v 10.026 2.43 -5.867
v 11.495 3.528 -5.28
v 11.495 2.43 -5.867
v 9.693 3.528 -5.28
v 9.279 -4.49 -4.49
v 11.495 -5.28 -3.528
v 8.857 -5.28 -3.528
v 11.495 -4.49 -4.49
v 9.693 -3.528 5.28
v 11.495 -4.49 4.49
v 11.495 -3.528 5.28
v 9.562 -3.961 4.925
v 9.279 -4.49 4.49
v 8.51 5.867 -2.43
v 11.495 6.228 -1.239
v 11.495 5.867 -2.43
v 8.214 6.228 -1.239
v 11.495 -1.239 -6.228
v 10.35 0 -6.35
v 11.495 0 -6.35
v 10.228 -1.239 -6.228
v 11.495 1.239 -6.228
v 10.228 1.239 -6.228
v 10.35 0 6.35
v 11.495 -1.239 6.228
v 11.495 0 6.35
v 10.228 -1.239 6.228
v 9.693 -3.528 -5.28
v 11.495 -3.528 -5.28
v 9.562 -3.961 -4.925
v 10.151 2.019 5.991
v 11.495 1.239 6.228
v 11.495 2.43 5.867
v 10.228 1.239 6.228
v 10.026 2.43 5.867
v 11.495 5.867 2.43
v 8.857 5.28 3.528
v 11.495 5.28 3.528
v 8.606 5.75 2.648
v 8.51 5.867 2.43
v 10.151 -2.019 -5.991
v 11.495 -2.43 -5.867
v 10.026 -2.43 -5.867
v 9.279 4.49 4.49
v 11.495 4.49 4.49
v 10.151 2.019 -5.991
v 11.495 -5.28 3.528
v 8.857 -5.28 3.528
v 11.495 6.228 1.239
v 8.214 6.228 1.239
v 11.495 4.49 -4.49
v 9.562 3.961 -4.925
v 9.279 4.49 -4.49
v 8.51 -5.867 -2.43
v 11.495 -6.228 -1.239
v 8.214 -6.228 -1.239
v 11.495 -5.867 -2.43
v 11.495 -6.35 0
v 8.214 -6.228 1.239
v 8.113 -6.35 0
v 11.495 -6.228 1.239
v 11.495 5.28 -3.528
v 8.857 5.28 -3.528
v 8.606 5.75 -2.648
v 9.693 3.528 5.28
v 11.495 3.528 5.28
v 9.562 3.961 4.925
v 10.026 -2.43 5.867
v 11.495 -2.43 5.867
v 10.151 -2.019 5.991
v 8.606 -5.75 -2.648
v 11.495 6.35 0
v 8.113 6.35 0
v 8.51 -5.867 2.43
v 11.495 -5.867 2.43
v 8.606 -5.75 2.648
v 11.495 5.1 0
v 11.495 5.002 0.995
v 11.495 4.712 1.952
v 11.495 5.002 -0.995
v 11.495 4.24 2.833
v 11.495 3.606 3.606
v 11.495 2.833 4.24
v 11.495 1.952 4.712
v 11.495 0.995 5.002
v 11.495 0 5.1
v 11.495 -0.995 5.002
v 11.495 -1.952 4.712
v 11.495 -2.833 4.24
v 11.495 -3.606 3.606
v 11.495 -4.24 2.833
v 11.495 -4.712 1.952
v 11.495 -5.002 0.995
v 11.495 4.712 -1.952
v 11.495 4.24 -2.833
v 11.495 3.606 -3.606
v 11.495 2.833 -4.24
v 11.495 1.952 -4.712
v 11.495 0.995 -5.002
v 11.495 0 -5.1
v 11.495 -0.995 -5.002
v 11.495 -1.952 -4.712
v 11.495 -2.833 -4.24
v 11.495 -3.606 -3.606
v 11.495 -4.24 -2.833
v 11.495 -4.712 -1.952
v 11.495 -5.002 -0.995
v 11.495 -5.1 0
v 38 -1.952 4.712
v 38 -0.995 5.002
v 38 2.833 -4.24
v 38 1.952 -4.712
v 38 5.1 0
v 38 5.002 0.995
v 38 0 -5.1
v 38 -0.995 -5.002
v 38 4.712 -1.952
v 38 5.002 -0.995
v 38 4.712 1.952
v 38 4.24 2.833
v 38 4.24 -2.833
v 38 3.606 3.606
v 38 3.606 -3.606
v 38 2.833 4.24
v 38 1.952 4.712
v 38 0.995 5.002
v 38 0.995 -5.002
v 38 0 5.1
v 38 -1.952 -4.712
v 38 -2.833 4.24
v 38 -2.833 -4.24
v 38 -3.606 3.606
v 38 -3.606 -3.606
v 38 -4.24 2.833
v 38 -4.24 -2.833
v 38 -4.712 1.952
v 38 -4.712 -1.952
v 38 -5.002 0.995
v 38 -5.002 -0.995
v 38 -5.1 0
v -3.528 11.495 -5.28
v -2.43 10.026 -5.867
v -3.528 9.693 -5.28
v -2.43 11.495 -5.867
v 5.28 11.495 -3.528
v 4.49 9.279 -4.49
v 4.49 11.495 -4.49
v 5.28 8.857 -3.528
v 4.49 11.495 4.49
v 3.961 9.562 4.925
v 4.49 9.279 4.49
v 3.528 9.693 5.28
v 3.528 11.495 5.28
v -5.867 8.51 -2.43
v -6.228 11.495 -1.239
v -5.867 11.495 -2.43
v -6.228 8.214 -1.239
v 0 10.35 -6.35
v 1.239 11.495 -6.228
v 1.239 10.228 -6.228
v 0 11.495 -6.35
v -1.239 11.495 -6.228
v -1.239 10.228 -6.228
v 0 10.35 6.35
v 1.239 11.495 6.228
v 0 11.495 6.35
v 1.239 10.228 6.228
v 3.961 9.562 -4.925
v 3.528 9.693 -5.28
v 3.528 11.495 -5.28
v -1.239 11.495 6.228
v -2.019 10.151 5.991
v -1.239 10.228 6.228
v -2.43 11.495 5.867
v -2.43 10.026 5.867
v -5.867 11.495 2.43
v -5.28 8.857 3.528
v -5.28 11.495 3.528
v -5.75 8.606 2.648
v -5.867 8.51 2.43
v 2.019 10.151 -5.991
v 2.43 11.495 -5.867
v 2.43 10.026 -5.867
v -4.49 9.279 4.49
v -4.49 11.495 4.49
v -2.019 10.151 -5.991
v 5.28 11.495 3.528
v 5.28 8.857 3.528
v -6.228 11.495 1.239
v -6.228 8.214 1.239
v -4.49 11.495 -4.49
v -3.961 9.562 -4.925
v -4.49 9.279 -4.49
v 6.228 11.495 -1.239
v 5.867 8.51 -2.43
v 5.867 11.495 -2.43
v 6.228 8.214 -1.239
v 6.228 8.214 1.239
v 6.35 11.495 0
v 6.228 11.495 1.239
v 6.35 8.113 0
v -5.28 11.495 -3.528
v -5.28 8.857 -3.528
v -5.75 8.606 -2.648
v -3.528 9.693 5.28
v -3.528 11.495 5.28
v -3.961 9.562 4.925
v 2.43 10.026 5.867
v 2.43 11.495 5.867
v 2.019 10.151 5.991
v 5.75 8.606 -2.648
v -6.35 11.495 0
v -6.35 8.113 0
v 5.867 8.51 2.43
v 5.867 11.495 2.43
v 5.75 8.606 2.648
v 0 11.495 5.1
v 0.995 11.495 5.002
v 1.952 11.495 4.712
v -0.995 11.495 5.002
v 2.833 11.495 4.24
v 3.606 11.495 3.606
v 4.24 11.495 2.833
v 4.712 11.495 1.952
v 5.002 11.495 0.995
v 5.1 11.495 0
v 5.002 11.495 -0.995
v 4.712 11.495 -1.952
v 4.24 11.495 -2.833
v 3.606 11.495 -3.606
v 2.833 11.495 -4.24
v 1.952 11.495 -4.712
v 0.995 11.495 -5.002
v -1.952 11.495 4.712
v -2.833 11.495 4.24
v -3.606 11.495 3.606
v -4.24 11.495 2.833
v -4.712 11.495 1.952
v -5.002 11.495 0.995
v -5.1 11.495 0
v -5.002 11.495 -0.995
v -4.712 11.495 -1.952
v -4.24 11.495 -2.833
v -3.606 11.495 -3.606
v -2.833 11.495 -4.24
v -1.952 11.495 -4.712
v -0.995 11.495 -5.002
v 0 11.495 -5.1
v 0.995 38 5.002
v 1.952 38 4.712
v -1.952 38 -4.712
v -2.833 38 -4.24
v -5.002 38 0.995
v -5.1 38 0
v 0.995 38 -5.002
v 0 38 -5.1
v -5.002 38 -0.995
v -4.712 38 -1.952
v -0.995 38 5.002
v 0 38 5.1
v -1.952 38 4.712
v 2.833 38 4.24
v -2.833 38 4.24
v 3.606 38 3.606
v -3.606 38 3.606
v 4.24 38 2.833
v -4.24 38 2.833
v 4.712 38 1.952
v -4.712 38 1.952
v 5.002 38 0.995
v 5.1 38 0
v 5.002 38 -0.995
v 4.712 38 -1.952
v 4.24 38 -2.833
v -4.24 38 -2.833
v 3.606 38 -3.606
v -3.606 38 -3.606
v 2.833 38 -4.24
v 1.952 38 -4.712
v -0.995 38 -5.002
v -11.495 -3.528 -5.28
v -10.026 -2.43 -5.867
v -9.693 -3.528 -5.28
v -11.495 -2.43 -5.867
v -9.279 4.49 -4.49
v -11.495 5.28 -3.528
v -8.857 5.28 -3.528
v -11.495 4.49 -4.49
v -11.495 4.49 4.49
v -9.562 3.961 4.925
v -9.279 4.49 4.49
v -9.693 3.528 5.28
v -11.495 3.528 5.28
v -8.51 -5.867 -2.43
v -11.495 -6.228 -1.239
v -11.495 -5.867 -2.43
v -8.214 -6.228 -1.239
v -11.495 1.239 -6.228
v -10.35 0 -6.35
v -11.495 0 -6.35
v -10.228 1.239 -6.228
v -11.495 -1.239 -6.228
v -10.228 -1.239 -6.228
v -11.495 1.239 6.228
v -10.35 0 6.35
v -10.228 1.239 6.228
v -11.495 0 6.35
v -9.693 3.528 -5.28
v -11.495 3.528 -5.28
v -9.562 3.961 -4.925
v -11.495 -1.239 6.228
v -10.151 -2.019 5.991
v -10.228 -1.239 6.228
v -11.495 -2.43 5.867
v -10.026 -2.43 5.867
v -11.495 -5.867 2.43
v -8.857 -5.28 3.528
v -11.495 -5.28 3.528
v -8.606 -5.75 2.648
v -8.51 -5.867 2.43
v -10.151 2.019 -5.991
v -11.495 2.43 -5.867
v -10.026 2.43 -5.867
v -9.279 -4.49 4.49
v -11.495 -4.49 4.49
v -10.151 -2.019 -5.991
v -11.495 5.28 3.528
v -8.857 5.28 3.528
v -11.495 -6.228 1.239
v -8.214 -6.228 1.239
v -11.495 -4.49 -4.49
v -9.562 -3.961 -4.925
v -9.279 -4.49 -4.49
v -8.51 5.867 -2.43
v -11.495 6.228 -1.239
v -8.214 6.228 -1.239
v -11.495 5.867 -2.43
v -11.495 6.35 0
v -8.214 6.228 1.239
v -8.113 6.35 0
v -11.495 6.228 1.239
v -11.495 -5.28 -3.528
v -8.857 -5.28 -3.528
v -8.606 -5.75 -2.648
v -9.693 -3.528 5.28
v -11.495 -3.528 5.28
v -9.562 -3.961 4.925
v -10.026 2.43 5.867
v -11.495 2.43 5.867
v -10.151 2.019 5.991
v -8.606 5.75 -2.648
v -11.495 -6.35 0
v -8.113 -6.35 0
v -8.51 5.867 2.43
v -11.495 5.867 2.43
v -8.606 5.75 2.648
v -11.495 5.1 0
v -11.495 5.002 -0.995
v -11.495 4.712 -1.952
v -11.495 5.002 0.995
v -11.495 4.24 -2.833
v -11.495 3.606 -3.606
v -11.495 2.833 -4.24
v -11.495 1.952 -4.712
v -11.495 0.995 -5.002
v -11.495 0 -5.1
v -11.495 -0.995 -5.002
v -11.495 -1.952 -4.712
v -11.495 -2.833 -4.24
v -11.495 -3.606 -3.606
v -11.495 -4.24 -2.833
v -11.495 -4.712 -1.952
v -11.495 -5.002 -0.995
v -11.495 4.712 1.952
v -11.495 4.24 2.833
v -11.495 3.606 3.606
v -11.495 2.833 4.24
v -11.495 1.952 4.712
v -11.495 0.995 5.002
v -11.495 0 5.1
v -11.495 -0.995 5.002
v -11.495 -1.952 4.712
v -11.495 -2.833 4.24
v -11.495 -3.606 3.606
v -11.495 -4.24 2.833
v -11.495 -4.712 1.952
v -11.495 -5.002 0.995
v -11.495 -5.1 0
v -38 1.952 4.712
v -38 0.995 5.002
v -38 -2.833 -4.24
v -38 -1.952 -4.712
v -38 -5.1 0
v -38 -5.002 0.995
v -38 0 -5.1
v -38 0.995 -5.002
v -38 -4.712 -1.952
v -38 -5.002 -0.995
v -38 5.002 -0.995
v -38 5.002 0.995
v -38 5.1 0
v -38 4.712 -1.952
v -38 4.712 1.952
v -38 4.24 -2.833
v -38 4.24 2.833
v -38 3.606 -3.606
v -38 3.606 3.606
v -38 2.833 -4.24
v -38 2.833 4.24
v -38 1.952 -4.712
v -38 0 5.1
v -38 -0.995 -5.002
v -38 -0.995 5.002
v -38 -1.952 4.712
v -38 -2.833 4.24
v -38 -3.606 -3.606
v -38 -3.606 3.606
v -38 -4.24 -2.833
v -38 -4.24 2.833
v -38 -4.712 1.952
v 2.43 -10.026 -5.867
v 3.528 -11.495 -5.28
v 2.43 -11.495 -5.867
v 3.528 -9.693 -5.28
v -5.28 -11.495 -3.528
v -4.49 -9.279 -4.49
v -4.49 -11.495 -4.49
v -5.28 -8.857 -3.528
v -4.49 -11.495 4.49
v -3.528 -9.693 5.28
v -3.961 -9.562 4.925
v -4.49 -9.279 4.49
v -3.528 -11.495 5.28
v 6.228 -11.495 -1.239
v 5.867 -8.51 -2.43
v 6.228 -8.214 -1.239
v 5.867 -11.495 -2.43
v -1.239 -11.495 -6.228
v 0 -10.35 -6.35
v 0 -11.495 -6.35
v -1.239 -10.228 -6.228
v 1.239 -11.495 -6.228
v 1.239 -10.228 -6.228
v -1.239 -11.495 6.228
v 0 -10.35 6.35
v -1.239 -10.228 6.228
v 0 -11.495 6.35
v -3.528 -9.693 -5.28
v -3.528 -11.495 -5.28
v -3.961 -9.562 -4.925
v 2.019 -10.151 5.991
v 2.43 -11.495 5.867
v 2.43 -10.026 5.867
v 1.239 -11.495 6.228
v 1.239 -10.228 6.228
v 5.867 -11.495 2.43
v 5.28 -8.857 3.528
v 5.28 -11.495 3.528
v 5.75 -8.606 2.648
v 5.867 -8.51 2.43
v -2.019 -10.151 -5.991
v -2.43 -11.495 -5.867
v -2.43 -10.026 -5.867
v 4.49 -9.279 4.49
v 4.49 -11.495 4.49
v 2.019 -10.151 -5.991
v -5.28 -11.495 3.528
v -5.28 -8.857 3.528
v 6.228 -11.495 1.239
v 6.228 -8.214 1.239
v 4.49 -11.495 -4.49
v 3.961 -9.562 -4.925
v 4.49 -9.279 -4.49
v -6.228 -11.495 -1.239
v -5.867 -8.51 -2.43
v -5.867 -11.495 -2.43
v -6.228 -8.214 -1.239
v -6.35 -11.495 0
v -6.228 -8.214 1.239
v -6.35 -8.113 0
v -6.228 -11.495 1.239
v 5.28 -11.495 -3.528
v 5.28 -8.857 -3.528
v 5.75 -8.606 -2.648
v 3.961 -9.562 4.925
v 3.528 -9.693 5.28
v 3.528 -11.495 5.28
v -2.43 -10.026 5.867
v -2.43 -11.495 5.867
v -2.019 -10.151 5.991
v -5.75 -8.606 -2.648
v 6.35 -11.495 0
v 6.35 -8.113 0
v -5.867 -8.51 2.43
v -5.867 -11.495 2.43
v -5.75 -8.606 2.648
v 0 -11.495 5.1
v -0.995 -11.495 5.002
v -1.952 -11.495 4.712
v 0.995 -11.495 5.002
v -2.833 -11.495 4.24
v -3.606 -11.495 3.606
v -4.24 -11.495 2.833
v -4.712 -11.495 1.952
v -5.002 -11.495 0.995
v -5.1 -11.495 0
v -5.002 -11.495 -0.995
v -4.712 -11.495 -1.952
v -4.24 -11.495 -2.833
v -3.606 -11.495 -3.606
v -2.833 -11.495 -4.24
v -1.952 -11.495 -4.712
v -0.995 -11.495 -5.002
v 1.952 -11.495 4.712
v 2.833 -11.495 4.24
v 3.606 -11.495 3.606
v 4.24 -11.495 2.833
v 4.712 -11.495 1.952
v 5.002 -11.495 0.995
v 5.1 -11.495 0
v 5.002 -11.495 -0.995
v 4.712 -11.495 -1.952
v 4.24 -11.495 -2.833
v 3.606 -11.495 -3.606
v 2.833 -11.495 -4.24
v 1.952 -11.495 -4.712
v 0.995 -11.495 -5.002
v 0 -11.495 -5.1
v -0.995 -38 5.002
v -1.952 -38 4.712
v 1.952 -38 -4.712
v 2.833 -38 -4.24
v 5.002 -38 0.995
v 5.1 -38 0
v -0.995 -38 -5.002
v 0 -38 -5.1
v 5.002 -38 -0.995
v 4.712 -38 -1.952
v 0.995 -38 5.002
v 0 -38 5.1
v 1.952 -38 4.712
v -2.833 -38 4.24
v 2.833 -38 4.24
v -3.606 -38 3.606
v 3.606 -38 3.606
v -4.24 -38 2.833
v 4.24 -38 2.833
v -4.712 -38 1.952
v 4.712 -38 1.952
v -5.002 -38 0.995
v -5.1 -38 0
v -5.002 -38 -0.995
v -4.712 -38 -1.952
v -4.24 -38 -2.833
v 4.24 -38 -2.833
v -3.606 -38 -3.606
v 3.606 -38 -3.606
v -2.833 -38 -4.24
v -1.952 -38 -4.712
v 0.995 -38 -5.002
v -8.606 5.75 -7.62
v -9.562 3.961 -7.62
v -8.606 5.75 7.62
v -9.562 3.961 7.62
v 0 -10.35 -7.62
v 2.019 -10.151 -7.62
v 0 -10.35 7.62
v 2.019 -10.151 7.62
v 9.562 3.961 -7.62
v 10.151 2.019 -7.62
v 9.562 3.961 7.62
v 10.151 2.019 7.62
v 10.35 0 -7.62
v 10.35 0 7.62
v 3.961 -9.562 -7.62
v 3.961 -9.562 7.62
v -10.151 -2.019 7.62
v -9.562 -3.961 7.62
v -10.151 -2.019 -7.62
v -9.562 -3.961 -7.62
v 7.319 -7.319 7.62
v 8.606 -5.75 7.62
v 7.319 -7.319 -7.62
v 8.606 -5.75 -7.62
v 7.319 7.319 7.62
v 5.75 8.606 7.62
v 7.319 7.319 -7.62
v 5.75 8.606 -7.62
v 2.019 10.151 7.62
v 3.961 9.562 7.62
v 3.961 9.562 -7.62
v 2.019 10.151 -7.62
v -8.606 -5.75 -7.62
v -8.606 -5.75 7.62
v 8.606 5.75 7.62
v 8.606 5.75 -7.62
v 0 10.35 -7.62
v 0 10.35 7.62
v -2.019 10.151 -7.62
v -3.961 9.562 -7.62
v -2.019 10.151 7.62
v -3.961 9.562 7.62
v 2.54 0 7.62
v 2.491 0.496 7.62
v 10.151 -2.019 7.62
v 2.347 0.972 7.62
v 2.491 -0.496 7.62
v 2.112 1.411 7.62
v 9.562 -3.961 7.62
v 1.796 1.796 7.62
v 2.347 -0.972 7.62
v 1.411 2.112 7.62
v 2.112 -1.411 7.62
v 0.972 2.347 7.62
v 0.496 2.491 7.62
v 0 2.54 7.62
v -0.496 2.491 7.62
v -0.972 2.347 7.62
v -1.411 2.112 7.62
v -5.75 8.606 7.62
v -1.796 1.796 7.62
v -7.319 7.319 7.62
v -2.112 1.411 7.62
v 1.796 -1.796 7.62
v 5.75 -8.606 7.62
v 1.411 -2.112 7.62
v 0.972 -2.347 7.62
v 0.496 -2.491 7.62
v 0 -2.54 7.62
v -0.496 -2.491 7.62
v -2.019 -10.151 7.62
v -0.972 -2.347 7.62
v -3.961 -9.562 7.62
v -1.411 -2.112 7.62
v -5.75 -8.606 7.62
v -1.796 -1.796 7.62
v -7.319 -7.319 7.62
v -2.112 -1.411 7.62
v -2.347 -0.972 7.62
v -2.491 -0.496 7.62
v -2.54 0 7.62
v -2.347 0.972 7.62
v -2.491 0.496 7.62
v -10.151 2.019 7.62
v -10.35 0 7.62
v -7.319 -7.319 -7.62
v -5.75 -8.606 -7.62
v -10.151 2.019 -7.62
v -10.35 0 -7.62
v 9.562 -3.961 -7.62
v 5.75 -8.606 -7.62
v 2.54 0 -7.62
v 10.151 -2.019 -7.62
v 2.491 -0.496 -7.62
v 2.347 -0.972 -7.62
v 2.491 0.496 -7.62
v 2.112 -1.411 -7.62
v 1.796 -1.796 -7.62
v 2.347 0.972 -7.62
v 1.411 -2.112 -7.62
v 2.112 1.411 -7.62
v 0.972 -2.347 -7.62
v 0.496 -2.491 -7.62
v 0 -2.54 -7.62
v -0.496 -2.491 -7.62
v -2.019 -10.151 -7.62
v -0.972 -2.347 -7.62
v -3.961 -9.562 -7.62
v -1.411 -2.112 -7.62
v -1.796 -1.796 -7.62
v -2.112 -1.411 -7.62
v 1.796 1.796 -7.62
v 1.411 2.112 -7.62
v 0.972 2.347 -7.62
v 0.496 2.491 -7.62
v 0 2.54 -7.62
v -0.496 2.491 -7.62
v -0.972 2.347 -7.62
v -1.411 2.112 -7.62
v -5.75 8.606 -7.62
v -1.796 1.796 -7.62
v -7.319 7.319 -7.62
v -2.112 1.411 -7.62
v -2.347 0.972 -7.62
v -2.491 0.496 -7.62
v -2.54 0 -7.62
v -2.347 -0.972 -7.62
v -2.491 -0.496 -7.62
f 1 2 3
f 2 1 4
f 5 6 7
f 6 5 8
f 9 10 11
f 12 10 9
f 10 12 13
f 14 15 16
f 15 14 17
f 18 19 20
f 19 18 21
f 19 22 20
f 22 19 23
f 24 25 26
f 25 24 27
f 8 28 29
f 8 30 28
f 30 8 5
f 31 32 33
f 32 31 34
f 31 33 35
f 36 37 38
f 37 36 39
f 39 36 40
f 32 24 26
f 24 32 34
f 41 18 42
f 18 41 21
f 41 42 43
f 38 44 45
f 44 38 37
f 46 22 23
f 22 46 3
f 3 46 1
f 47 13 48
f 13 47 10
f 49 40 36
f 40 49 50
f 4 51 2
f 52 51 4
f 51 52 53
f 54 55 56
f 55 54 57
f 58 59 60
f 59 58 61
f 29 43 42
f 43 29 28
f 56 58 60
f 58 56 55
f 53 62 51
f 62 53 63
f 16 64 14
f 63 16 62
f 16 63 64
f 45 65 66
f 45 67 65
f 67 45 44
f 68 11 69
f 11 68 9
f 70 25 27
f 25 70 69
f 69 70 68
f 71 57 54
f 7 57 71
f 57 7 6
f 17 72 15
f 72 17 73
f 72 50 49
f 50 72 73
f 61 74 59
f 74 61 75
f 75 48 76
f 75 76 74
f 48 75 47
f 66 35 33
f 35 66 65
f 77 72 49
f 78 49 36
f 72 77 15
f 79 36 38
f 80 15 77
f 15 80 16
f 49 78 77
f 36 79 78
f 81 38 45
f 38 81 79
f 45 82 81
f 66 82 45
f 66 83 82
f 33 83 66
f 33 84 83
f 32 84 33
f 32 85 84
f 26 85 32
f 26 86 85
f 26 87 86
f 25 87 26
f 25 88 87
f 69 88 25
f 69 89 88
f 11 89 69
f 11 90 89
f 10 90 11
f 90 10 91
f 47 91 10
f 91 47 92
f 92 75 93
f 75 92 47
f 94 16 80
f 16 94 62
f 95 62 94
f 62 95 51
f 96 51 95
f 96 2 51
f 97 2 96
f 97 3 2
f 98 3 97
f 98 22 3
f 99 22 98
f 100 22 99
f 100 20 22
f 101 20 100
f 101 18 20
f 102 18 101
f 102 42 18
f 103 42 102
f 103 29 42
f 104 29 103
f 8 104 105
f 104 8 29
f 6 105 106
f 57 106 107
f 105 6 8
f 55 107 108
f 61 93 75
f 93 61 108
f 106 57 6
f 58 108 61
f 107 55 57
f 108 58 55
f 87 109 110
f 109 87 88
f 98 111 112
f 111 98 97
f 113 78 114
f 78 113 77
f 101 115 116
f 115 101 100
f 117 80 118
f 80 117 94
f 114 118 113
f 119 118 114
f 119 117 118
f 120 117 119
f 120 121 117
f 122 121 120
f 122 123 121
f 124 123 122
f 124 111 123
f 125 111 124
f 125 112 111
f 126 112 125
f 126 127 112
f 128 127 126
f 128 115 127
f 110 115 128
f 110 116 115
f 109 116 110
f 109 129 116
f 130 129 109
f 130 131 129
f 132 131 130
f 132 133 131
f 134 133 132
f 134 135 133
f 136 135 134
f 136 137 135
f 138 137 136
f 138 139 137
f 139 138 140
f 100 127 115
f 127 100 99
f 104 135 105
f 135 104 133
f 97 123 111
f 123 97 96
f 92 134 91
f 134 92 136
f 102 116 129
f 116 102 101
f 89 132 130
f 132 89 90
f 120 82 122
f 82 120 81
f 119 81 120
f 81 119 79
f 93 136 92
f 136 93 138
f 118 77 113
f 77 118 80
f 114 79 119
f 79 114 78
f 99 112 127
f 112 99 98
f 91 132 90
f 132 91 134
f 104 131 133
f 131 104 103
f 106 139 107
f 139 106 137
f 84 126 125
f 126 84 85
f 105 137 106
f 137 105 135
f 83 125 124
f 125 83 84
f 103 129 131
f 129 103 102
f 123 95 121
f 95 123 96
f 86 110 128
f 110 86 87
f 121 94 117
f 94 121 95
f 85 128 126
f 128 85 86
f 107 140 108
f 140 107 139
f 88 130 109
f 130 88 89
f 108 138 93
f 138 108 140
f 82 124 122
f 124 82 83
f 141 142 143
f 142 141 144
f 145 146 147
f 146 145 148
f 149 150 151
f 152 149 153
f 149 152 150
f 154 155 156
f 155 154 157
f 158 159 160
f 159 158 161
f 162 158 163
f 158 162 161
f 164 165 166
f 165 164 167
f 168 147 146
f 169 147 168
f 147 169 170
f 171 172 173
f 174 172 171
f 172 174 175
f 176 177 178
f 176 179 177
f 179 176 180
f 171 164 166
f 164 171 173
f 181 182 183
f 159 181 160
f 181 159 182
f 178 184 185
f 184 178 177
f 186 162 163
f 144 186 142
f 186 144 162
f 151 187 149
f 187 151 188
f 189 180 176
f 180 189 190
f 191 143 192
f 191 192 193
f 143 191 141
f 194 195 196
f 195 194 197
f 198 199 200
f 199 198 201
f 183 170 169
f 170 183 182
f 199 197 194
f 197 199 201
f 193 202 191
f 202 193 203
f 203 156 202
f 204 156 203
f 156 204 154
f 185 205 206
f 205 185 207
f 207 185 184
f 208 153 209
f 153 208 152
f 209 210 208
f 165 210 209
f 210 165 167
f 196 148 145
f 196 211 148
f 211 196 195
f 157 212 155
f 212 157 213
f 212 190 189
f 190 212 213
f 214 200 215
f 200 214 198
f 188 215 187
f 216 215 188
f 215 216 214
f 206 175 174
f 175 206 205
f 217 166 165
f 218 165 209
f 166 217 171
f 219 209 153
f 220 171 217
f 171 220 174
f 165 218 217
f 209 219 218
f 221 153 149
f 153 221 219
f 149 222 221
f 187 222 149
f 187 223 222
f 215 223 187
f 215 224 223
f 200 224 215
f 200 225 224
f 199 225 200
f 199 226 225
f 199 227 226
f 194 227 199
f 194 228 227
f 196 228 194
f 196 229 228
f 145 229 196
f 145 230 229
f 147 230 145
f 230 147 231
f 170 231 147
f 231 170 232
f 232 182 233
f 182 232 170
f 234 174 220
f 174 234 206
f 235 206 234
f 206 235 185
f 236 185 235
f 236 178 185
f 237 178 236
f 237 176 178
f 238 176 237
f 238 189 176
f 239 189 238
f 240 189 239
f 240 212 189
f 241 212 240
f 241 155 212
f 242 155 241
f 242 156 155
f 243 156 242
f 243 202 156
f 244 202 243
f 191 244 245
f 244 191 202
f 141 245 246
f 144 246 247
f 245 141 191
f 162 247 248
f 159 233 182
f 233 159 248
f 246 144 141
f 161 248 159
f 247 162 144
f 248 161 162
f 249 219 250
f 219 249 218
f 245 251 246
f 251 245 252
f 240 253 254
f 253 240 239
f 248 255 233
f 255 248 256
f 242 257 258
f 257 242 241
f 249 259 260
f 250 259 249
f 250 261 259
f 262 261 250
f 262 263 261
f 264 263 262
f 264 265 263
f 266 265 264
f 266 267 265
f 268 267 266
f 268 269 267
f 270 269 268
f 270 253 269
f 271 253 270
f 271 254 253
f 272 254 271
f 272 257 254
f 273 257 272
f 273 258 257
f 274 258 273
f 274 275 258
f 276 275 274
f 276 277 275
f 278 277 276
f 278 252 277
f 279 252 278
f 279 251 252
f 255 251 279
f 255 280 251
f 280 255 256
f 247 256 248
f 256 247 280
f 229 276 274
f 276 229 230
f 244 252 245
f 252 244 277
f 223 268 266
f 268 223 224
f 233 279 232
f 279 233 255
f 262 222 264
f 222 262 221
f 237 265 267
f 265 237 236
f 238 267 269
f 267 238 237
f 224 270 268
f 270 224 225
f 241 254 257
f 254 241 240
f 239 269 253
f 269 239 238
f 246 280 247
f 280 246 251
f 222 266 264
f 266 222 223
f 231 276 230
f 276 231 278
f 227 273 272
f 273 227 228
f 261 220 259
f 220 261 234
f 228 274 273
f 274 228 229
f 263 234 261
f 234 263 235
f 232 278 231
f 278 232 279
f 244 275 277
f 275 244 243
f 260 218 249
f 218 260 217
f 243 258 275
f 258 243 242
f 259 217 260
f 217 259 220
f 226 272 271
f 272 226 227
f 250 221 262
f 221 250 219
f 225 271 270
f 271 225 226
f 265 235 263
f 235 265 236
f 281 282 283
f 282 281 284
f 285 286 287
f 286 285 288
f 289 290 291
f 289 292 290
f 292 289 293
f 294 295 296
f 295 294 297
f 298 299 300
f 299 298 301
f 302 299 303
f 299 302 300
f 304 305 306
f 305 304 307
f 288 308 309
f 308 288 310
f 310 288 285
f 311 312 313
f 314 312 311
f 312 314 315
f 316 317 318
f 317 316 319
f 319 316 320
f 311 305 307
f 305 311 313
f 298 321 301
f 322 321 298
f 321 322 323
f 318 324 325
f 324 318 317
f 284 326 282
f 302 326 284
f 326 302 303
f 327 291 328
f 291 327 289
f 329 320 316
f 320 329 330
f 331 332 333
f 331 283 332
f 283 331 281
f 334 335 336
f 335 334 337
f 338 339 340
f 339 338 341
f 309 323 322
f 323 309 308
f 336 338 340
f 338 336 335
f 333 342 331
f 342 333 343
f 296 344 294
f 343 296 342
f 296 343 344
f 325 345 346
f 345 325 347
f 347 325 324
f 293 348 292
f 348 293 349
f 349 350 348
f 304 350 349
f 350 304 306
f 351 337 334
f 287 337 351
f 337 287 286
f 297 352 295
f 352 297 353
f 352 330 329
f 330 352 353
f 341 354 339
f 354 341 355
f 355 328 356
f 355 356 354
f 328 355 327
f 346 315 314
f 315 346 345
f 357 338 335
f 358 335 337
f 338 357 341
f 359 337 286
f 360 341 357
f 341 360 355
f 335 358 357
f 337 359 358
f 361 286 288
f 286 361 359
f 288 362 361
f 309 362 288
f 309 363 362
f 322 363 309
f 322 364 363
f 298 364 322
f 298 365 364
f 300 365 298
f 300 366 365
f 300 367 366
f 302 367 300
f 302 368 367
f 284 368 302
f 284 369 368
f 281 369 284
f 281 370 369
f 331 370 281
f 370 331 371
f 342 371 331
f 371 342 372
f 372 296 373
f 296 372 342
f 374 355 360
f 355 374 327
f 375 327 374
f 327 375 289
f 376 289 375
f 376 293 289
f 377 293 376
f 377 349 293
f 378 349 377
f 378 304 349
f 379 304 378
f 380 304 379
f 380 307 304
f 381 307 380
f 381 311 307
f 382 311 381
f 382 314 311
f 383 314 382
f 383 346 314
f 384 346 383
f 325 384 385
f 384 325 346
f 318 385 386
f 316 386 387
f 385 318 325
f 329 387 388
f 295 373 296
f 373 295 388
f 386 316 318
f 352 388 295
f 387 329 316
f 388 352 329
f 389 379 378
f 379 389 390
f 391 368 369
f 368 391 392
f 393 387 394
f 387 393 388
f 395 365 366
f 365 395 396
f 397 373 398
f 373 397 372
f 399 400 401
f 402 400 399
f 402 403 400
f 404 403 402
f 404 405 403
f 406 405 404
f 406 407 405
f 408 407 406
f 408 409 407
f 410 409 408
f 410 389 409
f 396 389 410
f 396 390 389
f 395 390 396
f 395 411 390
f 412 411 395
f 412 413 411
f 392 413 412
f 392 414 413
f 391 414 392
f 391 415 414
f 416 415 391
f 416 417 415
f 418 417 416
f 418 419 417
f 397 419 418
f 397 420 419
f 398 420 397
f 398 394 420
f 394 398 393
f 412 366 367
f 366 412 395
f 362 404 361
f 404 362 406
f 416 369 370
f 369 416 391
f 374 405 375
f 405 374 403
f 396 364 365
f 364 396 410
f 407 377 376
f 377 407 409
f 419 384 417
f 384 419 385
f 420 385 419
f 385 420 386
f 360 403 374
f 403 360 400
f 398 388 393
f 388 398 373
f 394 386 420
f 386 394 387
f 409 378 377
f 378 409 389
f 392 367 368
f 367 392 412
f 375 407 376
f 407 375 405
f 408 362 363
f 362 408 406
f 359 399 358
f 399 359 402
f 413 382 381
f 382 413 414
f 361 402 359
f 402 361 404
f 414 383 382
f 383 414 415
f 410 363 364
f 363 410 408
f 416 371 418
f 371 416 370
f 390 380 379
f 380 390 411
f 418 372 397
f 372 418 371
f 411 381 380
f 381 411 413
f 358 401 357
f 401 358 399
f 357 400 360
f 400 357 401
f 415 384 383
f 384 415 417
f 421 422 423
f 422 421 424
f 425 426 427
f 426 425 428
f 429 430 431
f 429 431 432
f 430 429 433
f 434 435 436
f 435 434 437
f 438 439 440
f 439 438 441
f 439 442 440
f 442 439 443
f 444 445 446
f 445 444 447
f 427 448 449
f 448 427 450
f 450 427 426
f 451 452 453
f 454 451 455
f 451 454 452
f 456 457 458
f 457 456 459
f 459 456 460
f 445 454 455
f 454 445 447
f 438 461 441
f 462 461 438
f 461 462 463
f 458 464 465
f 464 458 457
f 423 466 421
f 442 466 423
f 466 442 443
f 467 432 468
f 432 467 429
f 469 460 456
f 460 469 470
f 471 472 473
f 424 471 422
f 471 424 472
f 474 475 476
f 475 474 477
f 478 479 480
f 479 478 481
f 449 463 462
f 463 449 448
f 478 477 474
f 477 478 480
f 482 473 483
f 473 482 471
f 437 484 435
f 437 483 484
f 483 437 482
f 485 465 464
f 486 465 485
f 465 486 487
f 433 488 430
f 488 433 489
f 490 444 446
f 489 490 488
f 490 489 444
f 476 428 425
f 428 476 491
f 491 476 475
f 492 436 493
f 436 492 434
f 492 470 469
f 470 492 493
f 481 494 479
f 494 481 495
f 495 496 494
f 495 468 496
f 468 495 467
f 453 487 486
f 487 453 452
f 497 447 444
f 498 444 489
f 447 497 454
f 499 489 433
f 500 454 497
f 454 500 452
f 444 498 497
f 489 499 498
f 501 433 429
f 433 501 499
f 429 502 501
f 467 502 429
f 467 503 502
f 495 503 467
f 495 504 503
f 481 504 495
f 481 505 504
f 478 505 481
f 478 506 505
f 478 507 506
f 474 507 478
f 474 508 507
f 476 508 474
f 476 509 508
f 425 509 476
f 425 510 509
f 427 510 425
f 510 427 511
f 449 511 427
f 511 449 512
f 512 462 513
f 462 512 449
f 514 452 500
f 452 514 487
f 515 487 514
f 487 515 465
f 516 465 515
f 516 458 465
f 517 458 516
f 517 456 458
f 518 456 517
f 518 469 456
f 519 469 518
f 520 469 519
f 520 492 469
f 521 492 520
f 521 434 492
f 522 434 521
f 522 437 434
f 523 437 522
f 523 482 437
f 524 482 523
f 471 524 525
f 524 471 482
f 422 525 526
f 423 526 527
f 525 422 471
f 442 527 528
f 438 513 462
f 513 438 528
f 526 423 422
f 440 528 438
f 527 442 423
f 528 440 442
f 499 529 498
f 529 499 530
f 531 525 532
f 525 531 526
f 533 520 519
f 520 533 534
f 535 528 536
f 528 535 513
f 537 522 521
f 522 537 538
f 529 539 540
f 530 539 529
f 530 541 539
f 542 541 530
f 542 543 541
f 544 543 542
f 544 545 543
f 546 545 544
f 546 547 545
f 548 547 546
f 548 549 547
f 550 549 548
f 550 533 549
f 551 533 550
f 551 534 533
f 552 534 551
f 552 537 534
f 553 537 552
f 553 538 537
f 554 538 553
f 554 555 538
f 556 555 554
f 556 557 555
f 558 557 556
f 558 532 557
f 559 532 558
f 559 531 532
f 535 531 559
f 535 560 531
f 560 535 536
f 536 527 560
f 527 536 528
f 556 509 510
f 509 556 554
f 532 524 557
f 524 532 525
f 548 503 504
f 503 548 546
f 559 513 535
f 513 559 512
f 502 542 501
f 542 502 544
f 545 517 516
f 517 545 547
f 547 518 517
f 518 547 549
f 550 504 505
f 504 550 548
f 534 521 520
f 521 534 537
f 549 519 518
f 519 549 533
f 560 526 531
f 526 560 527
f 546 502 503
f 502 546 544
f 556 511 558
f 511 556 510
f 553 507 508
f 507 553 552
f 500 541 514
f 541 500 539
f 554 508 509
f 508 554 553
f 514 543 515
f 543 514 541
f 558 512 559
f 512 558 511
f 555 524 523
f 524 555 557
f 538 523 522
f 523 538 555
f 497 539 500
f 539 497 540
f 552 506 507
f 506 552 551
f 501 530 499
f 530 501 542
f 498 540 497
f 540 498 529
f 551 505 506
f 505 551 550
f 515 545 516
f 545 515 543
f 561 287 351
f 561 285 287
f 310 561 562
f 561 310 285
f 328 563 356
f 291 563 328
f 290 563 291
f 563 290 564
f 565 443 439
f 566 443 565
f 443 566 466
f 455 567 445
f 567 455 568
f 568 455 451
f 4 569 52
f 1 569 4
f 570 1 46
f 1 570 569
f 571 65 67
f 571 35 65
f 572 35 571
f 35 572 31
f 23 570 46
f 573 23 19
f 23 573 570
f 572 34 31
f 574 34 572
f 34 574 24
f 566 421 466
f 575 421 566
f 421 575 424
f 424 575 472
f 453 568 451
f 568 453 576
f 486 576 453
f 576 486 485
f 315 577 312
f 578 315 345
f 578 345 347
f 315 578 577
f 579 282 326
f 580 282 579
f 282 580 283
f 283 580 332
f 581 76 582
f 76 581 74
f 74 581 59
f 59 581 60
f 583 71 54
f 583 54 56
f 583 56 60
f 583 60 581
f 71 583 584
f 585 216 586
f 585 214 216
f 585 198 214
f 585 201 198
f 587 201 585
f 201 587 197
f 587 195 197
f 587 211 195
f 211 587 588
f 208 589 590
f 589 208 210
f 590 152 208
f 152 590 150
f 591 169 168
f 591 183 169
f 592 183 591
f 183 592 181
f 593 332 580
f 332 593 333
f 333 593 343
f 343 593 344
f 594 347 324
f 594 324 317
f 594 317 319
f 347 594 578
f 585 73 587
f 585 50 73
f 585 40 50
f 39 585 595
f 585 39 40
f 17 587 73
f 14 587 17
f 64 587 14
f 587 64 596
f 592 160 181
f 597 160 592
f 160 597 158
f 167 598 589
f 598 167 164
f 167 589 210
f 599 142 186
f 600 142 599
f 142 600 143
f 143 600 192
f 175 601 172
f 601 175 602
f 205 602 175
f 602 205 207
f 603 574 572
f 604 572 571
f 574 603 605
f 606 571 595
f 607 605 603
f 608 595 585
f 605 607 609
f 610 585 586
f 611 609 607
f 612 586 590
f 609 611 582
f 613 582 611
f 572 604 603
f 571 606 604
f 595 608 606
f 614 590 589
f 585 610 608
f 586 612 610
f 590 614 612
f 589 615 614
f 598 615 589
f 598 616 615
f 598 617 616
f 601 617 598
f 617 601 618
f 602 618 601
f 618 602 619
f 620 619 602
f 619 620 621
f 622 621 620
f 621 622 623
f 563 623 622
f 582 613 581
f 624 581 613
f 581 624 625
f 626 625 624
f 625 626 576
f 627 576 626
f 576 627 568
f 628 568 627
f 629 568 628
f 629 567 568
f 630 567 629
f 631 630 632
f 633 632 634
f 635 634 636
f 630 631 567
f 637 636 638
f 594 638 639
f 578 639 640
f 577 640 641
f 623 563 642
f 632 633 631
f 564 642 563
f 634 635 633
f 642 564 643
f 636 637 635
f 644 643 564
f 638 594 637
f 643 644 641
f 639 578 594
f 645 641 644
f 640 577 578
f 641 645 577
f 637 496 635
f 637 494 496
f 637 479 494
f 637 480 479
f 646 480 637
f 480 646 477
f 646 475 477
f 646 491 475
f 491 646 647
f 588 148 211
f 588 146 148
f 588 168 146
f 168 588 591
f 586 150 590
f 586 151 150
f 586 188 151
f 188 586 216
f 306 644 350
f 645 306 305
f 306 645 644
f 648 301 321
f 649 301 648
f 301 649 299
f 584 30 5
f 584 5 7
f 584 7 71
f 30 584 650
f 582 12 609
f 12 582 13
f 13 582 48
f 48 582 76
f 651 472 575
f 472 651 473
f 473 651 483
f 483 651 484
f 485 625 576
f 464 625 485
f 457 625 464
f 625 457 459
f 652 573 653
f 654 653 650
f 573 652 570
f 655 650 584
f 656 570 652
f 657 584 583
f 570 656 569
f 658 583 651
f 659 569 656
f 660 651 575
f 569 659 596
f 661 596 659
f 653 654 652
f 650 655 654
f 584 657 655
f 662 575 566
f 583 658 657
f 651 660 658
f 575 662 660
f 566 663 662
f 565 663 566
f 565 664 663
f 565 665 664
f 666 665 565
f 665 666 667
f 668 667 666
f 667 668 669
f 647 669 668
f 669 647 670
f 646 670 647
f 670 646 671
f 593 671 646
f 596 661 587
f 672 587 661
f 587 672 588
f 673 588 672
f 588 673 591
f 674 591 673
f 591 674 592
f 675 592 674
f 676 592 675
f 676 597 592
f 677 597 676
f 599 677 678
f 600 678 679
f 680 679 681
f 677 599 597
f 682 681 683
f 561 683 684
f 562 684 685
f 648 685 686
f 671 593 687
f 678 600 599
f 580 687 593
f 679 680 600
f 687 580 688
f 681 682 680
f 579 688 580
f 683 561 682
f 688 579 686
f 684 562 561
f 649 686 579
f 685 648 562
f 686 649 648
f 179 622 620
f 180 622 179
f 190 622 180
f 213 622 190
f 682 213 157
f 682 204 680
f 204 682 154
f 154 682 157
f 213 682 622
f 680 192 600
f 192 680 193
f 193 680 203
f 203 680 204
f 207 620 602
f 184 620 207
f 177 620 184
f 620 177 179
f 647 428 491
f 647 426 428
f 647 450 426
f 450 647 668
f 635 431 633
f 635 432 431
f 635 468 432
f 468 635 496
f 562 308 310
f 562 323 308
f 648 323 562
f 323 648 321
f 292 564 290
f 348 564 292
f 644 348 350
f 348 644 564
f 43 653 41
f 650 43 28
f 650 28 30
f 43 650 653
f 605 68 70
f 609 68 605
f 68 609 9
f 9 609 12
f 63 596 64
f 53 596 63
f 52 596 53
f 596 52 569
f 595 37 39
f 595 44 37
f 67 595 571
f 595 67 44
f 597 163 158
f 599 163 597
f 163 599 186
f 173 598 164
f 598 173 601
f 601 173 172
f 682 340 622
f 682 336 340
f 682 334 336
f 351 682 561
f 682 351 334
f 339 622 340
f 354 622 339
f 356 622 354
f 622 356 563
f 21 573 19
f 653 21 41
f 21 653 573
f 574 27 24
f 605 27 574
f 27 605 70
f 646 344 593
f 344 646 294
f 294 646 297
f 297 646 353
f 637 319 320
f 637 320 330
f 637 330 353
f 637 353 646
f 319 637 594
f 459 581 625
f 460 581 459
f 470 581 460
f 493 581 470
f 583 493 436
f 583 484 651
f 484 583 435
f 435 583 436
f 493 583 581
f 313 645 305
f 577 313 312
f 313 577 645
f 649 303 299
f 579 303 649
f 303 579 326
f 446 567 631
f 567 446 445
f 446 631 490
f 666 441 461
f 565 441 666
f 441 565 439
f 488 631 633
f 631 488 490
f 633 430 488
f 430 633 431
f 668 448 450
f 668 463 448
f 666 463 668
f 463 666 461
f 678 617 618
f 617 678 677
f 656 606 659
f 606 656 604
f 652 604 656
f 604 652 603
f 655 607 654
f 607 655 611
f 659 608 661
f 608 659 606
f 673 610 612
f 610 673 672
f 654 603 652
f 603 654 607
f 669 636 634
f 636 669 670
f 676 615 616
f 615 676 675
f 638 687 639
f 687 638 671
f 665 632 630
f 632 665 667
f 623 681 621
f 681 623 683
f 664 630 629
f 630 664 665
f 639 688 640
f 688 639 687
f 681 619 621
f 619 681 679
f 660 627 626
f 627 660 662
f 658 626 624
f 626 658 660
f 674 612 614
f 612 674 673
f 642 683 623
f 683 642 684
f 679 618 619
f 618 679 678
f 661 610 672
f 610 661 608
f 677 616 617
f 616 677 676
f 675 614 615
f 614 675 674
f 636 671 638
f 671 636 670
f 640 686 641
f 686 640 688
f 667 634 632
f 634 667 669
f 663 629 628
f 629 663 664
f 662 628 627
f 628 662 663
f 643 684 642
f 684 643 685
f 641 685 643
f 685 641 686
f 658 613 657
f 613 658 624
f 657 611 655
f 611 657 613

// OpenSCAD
$fn = 32;

// ----------------------------------------------------------------------
// Cardan cross: 76 mm span, 12.7 mm trunnions
// ----------------------------------------------------------------------

// --- parameters (mm) ---
journal_d = 12.7;         // trunnion diameter
arm_len = 38;             // trunnion length from the centre
step_r = 4.32;            // step position from the centre
step_d = 10.2;            // journal diameter after the step
hub_d = 20.7;             // hub diameter
hub_h = 15.24;            // hub height
bore_d = 5.08;            // hub bore

difference() {
  union() {
    /* hub along the joint axis */
    cylinder(h = hub_h, d = hub_d, center = true);
    for (a = [0 : 90 : 270]) rotate([0, 0, a]) {
      /* trunnion, sunk into the hub */
      translate([hub_d / 4, 0, 0]) rotate([0, 90, 0]) cylinder(h = step_r + 2, d = journal_d);
      /* stepped journal out to the tip */
      translate([step_r - 0.5, 0, 0]) rotate([0, 90, 0]) cylinder(h = arm_len + 0.5 - step_r, d = step_d);
    }
  }
  /* lubrication bore through the hub, 2.5 mm clear on both sides */
  translate([0, 0, -hub_h / 2 - 2.5]) cylinder(h = hub_h + 5, d = bore_d);
}
